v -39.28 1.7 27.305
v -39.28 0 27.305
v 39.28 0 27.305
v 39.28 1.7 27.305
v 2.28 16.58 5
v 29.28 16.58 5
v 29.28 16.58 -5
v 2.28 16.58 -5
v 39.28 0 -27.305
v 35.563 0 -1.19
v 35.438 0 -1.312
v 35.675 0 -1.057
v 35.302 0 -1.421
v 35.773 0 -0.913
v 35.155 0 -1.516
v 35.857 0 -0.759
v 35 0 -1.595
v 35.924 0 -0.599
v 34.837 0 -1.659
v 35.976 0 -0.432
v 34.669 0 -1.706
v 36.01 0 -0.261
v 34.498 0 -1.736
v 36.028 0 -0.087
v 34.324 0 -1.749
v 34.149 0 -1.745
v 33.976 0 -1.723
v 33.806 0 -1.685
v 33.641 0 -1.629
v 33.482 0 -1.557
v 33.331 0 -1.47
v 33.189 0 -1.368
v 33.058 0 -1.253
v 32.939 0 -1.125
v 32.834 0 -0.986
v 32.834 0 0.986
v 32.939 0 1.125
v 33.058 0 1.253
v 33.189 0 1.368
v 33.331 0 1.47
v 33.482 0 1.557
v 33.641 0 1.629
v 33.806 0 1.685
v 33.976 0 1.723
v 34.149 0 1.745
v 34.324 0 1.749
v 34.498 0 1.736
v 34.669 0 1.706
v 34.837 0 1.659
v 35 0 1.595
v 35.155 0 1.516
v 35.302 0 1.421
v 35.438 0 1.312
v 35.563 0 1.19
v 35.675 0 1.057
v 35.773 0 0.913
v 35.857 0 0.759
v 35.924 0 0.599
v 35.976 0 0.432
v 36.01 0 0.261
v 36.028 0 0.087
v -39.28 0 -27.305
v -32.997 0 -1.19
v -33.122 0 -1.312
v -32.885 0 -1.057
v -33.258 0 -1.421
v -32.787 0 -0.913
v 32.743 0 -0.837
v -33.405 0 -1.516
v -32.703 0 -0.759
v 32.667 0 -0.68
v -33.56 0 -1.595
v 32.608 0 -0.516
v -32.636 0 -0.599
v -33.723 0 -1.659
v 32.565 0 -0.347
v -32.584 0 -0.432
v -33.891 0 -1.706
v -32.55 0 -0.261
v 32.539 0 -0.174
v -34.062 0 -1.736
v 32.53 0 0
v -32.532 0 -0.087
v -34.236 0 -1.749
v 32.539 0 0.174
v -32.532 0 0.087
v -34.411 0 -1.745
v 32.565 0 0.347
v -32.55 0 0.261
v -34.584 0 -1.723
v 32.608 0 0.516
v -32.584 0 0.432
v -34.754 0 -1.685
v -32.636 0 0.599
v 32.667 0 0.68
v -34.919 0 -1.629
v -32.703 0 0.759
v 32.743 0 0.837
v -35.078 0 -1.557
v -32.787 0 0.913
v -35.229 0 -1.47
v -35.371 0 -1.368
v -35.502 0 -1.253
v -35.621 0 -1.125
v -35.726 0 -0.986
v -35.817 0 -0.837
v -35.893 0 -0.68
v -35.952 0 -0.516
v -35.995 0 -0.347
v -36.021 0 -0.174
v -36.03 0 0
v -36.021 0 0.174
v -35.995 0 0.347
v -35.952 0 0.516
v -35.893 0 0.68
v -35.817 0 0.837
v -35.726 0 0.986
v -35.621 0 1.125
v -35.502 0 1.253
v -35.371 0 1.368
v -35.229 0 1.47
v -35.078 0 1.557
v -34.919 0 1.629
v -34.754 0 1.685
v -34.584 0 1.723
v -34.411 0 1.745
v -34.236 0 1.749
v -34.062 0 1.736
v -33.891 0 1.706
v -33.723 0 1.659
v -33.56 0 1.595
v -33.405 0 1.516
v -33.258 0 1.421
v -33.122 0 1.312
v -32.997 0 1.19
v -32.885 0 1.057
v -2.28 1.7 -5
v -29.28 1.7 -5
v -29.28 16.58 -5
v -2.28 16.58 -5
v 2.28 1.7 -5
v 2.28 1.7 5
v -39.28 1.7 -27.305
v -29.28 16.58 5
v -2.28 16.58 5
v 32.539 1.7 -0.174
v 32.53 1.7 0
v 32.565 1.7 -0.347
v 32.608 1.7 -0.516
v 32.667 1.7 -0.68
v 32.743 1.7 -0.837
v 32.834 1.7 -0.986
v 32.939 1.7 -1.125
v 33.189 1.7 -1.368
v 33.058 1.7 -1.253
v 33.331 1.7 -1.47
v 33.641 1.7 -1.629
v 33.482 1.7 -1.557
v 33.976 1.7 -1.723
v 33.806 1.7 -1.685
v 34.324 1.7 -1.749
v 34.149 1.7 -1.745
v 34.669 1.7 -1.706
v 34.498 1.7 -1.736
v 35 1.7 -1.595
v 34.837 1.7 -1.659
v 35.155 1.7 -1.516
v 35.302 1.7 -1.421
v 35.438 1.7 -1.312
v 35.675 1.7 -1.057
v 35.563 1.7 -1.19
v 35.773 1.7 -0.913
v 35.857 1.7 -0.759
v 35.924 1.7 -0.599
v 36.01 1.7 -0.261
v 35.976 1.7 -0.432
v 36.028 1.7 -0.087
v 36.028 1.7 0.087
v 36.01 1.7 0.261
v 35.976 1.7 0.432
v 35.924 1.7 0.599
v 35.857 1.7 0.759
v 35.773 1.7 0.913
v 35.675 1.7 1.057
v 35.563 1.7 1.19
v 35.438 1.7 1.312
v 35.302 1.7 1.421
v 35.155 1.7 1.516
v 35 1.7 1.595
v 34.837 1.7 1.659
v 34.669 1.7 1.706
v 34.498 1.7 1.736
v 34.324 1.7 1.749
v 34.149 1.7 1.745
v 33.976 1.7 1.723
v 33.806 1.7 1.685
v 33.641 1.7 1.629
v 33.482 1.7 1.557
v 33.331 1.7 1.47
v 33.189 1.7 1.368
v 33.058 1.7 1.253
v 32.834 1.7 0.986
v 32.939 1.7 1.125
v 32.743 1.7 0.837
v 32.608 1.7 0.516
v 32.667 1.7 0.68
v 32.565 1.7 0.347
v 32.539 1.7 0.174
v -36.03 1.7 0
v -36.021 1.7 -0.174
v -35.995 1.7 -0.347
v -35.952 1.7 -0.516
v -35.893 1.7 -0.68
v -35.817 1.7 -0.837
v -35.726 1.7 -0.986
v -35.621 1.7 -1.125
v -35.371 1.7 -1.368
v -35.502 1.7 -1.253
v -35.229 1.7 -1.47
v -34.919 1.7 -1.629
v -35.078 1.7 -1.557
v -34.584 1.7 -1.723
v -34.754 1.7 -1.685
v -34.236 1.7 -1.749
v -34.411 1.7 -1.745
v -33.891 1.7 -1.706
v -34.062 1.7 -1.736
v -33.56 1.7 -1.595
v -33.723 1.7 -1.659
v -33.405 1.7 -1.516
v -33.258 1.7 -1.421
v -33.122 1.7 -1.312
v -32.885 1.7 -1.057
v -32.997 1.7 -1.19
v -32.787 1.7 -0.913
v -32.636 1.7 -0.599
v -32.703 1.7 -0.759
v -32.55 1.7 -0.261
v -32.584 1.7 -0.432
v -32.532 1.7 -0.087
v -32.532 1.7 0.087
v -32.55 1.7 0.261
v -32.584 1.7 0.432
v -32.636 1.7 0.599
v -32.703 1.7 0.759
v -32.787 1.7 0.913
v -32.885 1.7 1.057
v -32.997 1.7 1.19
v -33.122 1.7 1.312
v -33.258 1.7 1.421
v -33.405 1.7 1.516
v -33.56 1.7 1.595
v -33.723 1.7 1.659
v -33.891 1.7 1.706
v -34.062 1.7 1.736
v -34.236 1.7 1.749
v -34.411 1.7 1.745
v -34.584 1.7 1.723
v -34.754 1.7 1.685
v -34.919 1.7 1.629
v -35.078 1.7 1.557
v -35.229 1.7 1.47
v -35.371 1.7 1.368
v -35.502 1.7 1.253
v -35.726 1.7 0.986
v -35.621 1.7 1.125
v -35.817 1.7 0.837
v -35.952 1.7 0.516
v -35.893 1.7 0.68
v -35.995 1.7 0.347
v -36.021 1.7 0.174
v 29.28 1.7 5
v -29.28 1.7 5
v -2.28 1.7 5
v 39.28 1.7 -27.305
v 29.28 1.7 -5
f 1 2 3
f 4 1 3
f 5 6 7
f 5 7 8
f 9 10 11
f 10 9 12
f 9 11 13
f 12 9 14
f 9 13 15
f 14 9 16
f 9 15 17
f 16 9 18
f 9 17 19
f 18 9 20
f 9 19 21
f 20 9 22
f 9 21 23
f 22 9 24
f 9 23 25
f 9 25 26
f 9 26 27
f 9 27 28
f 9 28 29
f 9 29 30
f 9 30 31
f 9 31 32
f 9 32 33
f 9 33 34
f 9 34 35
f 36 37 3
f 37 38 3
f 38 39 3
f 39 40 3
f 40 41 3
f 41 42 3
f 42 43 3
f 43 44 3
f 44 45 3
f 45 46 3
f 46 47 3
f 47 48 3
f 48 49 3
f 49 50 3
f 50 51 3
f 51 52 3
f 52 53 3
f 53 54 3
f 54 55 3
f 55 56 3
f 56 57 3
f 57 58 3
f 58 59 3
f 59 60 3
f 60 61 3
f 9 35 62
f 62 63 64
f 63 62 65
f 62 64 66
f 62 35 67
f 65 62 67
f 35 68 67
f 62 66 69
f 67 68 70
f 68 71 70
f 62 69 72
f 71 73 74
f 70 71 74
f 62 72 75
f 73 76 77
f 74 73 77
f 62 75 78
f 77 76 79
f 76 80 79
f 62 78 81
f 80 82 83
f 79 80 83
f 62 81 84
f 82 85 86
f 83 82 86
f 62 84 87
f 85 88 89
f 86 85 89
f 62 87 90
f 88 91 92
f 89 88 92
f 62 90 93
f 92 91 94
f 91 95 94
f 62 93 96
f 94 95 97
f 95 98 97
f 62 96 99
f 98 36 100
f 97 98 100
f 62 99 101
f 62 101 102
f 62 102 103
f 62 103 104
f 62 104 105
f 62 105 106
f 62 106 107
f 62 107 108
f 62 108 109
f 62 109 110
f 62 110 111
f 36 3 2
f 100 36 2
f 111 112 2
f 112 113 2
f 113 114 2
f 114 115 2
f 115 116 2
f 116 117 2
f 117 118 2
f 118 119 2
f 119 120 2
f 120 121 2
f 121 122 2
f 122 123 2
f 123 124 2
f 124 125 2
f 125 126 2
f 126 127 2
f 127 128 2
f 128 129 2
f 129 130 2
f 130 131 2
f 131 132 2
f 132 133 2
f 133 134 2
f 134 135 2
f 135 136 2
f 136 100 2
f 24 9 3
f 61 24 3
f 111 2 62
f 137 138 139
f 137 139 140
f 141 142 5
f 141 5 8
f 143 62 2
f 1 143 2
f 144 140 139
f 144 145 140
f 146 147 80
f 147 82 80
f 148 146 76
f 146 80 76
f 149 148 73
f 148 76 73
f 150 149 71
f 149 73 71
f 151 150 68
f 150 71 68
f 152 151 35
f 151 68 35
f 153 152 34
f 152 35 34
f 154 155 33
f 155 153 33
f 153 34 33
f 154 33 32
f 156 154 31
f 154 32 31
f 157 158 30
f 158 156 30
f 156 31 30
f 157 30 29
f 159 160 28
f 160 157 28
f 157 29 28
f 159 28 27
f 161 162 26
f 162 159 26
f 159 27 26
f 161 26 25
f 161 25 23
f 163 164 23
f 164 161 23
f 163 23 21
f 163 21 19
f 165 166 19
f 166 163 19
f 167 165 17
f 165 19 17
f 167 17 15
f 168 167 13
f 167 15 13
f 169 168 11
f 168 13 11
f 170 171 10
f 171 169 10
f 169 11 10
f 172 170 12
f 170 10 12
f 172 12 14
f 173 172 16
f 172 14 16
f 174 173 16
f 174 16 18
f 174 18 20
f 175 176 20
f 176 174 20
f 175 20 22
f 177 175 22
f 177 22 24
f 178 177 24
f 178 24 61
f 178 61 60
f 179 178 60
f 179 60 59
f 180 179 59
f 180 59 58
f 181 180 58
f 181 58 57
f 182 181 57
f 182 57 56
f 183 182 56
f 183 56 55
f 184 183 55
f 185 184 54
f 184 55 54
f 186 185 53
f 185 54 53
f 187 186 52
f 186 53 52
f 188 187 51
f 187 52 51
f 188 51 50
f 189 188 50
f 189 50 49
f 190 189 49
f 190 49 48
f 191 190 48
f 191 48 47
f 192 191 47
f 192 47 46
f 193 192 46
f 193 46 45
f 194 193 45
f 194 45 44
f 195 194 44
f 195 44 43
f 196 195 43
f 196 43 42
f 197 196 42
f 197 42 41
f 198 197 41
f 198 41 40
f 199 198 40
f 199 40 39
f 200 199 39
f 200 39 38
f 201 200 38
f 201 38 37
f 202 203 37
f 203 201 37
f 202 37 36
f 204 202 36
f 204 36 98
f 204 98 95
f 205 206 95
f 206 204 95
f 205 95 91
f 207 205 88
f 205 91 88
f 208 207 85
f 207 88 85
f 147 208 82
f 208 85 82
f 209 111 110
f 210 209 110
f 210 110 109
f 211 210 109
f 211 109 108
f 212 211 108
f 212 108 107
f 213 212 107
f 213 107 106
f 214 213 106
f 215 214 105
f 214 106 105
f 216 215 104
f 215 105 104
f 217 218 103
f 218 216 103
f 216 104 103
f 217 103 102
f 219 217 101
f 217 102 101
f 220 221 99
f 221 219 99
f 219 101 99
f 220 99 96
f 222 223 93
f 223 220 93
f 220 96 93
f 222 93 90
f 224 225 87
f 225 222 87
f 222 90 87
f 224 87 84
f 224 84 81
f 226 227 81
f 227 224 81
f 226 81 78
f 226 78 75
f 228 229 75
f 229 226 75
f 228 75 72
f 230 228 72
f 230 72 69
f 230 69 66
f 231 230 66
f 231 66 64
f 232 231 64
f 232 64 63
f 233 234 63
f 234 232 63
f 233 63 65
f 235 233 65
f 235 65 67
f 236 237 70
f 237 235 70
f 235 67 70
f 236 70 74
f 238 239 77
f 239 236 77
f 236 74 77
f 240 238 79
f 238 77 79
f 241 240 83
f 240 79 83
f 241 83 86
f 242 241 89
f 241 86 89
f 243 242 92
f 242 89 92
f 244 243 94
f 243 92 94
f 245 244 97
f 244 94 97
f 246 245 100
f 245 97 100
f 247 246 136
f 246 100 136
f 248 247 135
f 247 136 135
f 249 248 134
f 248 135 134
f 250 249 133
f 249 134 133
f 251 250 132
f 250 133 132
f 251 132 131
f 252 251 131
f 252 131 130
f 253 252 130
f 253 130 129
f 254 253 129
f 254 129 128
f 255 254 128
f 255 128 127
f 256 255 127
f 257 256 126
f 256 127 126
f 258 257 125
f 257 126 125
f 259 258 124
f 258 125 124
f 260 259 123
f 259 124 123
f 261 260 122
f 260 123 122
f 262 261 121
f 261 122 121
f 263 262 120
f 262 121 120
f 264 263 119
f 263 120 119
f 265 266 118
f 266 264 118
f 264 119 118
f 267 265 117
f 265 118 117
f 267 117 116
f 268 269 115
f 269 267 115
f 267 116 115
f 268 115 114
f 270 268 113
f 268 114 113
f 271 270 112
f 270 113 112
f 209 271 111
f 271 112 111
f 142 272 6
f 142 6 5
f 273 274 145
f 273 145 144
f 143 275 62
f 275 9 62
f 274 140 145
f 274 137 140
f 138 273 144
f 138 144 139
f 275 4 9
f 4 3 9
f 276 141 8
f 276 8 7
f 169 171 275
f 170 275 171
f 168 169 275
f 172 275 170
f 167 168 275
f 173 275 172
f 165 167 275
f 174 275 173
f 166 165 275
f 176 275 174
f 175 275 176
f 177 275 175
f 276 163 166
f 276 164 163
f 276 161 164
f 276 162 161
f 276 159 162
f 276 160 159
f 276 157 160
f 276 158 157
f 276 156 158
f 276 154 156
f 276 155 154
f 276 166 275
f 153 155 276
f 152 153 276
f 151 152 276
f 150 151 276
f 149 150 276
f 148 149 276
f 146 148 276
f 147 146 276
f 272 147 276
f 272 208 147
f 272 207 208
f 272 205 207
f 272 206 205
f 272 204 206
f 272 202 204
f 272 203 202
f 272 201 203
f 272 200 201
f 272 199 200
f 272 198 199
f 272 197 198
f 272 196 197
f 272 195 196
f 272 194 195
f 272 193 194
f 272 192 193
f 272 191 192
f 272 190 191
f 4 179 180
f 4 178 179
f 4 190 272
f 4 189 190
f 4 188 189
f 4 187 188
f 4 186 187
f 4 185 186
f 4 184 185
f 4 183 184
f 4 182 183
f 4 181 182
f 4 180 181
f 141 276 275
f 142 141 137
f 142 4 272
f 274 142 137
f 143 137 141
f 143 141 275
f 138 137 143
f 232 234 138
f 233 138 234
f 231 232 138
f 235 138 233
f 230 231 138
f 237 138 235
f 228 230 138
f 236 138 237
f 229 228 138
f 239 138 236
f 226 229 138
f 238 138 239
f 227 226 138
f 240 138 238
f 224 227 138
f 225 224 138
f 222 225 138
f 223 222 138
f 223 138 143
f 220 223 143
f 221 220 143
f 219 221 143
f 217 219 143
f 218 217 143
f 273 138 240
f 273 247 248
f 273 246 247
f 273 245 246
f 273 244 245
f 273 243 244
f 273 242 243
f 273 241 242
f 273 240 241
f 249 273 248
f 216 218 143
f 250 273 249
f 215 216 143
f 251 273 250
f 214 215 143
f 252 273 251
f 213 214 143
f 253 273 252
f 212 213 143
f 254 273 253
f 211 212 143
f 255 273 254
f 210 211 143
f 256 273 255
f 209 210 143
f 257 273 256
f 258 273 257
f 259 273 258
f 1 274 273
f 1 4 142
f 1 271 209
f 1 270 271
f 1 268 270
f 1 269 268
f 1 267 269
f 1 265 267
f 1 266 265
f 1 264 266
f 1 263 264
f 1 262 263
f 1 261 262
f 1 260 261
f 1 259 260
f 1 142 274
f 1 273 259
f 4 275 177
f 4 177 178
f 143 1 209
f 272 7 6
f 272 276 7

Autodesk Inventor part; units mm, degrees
ref_plane "YZ Plane" through (0, 0, 0) normal (1, 0, 0) x (0, 1, 0)
ref_plane "XZ Plane" through (0, 0, 0) normal (0, 1, 0) x (-1, 0, 0)
ref_plane "XY Plane" through (0, 0, 0) normal (0, 0, 1) x (1, 0, 0)
sketch "Sketch1" plane through (0, 0, 0) normal (0, 1, 0) x (-1, 0, 0)
  line L0 (39.28, 27.305) -> (-39.28, 27.305)
  line L1 (-39.28, 27.305) -> (-39.28, -27.305)
  line L2 (-39.28, -27.305) -> (39.28, -27.305)
  line L3 (39.28, -27.305) -> (39.28, 27.305)
  line L4 (39.28, 27.305) -> (-39.28, -27.305) construction
  line L5 (-39.28, 27.305) -> (39.28, -27.305) construction
  circle A0 centre (-34.28, 0) radius 1.75
  circle A1 centre (34.28, 0) radius 1.75
  line L6 (29.28, -5) -> (2.28, -5)
  line L7 (2.28, -5) -> (2.28, 5)
  line L8 (2.28, 5) -> (29.28, 5)
  line L9 (29.28, 5) -> (29.28, -5)
  line L10 (29.28, -5) -> (2.28, 5) construction
  line L11 (2.28, -5) -> (29.28, 5) construction
  line L12 (-29.28, 5) -> (-2.28, 5)
  line L13 (-2.28, 5) -> (-2.28, -5)
  line L14 (-2.28, -5) -> (-29.28, -5)
  line L15 (-29.28, -5) -> (-29.28, 5)
  line L16 (-29.28, 5) -> (-2.28, -5) construction
  line L17 (-2.28, 5) -> (-29.28, -5) construction
  point P0 (0, 0)
  point P1 (15.78, 0)
  point P2 (-15.78, 0)
  dimension "d0" = 78.56
  dimension "d1" = 54.61
  dimension "d2" = 3.5
  dimension "d3" = 5
  dimension "d4" = 3.5
  dimension "d5" = 5
  dimension "d6" = 27
  dimension "d7" = 10
  dimension "d8" = 5
  dimension "d9" = 27
  dimension "d10" = 10
  dimension "d11" = 5
  dimension "d16" = 68.56
extrude "Extrusion1" add sketch "Sketch1" along normal blind 1.7
extrude "Extrusion2" add sketch "Sketch1" along normal blind 16.58 contours L6 L7 L8 L9 | L12 L13 L14 L15
sketch "Sketch2" plane through (0, 1.7, 0) normal (0, 1, 0) x (1, 0, 0)
  line L0 (-13.9986, -11.26) -> (17.2433, -11.26) construction
  line L1 (17.2433, -11.26) -> (17.2433, -14.9075) construction
  line L2 (17.2433, -14.9075) -> (-13.9986, -14.9075) construction
  line L3 (-13.9986, -14.9075) -> (-13.9986, -11.26) construction
  point P0 (0, 0)
properties part number "powerdiset"
